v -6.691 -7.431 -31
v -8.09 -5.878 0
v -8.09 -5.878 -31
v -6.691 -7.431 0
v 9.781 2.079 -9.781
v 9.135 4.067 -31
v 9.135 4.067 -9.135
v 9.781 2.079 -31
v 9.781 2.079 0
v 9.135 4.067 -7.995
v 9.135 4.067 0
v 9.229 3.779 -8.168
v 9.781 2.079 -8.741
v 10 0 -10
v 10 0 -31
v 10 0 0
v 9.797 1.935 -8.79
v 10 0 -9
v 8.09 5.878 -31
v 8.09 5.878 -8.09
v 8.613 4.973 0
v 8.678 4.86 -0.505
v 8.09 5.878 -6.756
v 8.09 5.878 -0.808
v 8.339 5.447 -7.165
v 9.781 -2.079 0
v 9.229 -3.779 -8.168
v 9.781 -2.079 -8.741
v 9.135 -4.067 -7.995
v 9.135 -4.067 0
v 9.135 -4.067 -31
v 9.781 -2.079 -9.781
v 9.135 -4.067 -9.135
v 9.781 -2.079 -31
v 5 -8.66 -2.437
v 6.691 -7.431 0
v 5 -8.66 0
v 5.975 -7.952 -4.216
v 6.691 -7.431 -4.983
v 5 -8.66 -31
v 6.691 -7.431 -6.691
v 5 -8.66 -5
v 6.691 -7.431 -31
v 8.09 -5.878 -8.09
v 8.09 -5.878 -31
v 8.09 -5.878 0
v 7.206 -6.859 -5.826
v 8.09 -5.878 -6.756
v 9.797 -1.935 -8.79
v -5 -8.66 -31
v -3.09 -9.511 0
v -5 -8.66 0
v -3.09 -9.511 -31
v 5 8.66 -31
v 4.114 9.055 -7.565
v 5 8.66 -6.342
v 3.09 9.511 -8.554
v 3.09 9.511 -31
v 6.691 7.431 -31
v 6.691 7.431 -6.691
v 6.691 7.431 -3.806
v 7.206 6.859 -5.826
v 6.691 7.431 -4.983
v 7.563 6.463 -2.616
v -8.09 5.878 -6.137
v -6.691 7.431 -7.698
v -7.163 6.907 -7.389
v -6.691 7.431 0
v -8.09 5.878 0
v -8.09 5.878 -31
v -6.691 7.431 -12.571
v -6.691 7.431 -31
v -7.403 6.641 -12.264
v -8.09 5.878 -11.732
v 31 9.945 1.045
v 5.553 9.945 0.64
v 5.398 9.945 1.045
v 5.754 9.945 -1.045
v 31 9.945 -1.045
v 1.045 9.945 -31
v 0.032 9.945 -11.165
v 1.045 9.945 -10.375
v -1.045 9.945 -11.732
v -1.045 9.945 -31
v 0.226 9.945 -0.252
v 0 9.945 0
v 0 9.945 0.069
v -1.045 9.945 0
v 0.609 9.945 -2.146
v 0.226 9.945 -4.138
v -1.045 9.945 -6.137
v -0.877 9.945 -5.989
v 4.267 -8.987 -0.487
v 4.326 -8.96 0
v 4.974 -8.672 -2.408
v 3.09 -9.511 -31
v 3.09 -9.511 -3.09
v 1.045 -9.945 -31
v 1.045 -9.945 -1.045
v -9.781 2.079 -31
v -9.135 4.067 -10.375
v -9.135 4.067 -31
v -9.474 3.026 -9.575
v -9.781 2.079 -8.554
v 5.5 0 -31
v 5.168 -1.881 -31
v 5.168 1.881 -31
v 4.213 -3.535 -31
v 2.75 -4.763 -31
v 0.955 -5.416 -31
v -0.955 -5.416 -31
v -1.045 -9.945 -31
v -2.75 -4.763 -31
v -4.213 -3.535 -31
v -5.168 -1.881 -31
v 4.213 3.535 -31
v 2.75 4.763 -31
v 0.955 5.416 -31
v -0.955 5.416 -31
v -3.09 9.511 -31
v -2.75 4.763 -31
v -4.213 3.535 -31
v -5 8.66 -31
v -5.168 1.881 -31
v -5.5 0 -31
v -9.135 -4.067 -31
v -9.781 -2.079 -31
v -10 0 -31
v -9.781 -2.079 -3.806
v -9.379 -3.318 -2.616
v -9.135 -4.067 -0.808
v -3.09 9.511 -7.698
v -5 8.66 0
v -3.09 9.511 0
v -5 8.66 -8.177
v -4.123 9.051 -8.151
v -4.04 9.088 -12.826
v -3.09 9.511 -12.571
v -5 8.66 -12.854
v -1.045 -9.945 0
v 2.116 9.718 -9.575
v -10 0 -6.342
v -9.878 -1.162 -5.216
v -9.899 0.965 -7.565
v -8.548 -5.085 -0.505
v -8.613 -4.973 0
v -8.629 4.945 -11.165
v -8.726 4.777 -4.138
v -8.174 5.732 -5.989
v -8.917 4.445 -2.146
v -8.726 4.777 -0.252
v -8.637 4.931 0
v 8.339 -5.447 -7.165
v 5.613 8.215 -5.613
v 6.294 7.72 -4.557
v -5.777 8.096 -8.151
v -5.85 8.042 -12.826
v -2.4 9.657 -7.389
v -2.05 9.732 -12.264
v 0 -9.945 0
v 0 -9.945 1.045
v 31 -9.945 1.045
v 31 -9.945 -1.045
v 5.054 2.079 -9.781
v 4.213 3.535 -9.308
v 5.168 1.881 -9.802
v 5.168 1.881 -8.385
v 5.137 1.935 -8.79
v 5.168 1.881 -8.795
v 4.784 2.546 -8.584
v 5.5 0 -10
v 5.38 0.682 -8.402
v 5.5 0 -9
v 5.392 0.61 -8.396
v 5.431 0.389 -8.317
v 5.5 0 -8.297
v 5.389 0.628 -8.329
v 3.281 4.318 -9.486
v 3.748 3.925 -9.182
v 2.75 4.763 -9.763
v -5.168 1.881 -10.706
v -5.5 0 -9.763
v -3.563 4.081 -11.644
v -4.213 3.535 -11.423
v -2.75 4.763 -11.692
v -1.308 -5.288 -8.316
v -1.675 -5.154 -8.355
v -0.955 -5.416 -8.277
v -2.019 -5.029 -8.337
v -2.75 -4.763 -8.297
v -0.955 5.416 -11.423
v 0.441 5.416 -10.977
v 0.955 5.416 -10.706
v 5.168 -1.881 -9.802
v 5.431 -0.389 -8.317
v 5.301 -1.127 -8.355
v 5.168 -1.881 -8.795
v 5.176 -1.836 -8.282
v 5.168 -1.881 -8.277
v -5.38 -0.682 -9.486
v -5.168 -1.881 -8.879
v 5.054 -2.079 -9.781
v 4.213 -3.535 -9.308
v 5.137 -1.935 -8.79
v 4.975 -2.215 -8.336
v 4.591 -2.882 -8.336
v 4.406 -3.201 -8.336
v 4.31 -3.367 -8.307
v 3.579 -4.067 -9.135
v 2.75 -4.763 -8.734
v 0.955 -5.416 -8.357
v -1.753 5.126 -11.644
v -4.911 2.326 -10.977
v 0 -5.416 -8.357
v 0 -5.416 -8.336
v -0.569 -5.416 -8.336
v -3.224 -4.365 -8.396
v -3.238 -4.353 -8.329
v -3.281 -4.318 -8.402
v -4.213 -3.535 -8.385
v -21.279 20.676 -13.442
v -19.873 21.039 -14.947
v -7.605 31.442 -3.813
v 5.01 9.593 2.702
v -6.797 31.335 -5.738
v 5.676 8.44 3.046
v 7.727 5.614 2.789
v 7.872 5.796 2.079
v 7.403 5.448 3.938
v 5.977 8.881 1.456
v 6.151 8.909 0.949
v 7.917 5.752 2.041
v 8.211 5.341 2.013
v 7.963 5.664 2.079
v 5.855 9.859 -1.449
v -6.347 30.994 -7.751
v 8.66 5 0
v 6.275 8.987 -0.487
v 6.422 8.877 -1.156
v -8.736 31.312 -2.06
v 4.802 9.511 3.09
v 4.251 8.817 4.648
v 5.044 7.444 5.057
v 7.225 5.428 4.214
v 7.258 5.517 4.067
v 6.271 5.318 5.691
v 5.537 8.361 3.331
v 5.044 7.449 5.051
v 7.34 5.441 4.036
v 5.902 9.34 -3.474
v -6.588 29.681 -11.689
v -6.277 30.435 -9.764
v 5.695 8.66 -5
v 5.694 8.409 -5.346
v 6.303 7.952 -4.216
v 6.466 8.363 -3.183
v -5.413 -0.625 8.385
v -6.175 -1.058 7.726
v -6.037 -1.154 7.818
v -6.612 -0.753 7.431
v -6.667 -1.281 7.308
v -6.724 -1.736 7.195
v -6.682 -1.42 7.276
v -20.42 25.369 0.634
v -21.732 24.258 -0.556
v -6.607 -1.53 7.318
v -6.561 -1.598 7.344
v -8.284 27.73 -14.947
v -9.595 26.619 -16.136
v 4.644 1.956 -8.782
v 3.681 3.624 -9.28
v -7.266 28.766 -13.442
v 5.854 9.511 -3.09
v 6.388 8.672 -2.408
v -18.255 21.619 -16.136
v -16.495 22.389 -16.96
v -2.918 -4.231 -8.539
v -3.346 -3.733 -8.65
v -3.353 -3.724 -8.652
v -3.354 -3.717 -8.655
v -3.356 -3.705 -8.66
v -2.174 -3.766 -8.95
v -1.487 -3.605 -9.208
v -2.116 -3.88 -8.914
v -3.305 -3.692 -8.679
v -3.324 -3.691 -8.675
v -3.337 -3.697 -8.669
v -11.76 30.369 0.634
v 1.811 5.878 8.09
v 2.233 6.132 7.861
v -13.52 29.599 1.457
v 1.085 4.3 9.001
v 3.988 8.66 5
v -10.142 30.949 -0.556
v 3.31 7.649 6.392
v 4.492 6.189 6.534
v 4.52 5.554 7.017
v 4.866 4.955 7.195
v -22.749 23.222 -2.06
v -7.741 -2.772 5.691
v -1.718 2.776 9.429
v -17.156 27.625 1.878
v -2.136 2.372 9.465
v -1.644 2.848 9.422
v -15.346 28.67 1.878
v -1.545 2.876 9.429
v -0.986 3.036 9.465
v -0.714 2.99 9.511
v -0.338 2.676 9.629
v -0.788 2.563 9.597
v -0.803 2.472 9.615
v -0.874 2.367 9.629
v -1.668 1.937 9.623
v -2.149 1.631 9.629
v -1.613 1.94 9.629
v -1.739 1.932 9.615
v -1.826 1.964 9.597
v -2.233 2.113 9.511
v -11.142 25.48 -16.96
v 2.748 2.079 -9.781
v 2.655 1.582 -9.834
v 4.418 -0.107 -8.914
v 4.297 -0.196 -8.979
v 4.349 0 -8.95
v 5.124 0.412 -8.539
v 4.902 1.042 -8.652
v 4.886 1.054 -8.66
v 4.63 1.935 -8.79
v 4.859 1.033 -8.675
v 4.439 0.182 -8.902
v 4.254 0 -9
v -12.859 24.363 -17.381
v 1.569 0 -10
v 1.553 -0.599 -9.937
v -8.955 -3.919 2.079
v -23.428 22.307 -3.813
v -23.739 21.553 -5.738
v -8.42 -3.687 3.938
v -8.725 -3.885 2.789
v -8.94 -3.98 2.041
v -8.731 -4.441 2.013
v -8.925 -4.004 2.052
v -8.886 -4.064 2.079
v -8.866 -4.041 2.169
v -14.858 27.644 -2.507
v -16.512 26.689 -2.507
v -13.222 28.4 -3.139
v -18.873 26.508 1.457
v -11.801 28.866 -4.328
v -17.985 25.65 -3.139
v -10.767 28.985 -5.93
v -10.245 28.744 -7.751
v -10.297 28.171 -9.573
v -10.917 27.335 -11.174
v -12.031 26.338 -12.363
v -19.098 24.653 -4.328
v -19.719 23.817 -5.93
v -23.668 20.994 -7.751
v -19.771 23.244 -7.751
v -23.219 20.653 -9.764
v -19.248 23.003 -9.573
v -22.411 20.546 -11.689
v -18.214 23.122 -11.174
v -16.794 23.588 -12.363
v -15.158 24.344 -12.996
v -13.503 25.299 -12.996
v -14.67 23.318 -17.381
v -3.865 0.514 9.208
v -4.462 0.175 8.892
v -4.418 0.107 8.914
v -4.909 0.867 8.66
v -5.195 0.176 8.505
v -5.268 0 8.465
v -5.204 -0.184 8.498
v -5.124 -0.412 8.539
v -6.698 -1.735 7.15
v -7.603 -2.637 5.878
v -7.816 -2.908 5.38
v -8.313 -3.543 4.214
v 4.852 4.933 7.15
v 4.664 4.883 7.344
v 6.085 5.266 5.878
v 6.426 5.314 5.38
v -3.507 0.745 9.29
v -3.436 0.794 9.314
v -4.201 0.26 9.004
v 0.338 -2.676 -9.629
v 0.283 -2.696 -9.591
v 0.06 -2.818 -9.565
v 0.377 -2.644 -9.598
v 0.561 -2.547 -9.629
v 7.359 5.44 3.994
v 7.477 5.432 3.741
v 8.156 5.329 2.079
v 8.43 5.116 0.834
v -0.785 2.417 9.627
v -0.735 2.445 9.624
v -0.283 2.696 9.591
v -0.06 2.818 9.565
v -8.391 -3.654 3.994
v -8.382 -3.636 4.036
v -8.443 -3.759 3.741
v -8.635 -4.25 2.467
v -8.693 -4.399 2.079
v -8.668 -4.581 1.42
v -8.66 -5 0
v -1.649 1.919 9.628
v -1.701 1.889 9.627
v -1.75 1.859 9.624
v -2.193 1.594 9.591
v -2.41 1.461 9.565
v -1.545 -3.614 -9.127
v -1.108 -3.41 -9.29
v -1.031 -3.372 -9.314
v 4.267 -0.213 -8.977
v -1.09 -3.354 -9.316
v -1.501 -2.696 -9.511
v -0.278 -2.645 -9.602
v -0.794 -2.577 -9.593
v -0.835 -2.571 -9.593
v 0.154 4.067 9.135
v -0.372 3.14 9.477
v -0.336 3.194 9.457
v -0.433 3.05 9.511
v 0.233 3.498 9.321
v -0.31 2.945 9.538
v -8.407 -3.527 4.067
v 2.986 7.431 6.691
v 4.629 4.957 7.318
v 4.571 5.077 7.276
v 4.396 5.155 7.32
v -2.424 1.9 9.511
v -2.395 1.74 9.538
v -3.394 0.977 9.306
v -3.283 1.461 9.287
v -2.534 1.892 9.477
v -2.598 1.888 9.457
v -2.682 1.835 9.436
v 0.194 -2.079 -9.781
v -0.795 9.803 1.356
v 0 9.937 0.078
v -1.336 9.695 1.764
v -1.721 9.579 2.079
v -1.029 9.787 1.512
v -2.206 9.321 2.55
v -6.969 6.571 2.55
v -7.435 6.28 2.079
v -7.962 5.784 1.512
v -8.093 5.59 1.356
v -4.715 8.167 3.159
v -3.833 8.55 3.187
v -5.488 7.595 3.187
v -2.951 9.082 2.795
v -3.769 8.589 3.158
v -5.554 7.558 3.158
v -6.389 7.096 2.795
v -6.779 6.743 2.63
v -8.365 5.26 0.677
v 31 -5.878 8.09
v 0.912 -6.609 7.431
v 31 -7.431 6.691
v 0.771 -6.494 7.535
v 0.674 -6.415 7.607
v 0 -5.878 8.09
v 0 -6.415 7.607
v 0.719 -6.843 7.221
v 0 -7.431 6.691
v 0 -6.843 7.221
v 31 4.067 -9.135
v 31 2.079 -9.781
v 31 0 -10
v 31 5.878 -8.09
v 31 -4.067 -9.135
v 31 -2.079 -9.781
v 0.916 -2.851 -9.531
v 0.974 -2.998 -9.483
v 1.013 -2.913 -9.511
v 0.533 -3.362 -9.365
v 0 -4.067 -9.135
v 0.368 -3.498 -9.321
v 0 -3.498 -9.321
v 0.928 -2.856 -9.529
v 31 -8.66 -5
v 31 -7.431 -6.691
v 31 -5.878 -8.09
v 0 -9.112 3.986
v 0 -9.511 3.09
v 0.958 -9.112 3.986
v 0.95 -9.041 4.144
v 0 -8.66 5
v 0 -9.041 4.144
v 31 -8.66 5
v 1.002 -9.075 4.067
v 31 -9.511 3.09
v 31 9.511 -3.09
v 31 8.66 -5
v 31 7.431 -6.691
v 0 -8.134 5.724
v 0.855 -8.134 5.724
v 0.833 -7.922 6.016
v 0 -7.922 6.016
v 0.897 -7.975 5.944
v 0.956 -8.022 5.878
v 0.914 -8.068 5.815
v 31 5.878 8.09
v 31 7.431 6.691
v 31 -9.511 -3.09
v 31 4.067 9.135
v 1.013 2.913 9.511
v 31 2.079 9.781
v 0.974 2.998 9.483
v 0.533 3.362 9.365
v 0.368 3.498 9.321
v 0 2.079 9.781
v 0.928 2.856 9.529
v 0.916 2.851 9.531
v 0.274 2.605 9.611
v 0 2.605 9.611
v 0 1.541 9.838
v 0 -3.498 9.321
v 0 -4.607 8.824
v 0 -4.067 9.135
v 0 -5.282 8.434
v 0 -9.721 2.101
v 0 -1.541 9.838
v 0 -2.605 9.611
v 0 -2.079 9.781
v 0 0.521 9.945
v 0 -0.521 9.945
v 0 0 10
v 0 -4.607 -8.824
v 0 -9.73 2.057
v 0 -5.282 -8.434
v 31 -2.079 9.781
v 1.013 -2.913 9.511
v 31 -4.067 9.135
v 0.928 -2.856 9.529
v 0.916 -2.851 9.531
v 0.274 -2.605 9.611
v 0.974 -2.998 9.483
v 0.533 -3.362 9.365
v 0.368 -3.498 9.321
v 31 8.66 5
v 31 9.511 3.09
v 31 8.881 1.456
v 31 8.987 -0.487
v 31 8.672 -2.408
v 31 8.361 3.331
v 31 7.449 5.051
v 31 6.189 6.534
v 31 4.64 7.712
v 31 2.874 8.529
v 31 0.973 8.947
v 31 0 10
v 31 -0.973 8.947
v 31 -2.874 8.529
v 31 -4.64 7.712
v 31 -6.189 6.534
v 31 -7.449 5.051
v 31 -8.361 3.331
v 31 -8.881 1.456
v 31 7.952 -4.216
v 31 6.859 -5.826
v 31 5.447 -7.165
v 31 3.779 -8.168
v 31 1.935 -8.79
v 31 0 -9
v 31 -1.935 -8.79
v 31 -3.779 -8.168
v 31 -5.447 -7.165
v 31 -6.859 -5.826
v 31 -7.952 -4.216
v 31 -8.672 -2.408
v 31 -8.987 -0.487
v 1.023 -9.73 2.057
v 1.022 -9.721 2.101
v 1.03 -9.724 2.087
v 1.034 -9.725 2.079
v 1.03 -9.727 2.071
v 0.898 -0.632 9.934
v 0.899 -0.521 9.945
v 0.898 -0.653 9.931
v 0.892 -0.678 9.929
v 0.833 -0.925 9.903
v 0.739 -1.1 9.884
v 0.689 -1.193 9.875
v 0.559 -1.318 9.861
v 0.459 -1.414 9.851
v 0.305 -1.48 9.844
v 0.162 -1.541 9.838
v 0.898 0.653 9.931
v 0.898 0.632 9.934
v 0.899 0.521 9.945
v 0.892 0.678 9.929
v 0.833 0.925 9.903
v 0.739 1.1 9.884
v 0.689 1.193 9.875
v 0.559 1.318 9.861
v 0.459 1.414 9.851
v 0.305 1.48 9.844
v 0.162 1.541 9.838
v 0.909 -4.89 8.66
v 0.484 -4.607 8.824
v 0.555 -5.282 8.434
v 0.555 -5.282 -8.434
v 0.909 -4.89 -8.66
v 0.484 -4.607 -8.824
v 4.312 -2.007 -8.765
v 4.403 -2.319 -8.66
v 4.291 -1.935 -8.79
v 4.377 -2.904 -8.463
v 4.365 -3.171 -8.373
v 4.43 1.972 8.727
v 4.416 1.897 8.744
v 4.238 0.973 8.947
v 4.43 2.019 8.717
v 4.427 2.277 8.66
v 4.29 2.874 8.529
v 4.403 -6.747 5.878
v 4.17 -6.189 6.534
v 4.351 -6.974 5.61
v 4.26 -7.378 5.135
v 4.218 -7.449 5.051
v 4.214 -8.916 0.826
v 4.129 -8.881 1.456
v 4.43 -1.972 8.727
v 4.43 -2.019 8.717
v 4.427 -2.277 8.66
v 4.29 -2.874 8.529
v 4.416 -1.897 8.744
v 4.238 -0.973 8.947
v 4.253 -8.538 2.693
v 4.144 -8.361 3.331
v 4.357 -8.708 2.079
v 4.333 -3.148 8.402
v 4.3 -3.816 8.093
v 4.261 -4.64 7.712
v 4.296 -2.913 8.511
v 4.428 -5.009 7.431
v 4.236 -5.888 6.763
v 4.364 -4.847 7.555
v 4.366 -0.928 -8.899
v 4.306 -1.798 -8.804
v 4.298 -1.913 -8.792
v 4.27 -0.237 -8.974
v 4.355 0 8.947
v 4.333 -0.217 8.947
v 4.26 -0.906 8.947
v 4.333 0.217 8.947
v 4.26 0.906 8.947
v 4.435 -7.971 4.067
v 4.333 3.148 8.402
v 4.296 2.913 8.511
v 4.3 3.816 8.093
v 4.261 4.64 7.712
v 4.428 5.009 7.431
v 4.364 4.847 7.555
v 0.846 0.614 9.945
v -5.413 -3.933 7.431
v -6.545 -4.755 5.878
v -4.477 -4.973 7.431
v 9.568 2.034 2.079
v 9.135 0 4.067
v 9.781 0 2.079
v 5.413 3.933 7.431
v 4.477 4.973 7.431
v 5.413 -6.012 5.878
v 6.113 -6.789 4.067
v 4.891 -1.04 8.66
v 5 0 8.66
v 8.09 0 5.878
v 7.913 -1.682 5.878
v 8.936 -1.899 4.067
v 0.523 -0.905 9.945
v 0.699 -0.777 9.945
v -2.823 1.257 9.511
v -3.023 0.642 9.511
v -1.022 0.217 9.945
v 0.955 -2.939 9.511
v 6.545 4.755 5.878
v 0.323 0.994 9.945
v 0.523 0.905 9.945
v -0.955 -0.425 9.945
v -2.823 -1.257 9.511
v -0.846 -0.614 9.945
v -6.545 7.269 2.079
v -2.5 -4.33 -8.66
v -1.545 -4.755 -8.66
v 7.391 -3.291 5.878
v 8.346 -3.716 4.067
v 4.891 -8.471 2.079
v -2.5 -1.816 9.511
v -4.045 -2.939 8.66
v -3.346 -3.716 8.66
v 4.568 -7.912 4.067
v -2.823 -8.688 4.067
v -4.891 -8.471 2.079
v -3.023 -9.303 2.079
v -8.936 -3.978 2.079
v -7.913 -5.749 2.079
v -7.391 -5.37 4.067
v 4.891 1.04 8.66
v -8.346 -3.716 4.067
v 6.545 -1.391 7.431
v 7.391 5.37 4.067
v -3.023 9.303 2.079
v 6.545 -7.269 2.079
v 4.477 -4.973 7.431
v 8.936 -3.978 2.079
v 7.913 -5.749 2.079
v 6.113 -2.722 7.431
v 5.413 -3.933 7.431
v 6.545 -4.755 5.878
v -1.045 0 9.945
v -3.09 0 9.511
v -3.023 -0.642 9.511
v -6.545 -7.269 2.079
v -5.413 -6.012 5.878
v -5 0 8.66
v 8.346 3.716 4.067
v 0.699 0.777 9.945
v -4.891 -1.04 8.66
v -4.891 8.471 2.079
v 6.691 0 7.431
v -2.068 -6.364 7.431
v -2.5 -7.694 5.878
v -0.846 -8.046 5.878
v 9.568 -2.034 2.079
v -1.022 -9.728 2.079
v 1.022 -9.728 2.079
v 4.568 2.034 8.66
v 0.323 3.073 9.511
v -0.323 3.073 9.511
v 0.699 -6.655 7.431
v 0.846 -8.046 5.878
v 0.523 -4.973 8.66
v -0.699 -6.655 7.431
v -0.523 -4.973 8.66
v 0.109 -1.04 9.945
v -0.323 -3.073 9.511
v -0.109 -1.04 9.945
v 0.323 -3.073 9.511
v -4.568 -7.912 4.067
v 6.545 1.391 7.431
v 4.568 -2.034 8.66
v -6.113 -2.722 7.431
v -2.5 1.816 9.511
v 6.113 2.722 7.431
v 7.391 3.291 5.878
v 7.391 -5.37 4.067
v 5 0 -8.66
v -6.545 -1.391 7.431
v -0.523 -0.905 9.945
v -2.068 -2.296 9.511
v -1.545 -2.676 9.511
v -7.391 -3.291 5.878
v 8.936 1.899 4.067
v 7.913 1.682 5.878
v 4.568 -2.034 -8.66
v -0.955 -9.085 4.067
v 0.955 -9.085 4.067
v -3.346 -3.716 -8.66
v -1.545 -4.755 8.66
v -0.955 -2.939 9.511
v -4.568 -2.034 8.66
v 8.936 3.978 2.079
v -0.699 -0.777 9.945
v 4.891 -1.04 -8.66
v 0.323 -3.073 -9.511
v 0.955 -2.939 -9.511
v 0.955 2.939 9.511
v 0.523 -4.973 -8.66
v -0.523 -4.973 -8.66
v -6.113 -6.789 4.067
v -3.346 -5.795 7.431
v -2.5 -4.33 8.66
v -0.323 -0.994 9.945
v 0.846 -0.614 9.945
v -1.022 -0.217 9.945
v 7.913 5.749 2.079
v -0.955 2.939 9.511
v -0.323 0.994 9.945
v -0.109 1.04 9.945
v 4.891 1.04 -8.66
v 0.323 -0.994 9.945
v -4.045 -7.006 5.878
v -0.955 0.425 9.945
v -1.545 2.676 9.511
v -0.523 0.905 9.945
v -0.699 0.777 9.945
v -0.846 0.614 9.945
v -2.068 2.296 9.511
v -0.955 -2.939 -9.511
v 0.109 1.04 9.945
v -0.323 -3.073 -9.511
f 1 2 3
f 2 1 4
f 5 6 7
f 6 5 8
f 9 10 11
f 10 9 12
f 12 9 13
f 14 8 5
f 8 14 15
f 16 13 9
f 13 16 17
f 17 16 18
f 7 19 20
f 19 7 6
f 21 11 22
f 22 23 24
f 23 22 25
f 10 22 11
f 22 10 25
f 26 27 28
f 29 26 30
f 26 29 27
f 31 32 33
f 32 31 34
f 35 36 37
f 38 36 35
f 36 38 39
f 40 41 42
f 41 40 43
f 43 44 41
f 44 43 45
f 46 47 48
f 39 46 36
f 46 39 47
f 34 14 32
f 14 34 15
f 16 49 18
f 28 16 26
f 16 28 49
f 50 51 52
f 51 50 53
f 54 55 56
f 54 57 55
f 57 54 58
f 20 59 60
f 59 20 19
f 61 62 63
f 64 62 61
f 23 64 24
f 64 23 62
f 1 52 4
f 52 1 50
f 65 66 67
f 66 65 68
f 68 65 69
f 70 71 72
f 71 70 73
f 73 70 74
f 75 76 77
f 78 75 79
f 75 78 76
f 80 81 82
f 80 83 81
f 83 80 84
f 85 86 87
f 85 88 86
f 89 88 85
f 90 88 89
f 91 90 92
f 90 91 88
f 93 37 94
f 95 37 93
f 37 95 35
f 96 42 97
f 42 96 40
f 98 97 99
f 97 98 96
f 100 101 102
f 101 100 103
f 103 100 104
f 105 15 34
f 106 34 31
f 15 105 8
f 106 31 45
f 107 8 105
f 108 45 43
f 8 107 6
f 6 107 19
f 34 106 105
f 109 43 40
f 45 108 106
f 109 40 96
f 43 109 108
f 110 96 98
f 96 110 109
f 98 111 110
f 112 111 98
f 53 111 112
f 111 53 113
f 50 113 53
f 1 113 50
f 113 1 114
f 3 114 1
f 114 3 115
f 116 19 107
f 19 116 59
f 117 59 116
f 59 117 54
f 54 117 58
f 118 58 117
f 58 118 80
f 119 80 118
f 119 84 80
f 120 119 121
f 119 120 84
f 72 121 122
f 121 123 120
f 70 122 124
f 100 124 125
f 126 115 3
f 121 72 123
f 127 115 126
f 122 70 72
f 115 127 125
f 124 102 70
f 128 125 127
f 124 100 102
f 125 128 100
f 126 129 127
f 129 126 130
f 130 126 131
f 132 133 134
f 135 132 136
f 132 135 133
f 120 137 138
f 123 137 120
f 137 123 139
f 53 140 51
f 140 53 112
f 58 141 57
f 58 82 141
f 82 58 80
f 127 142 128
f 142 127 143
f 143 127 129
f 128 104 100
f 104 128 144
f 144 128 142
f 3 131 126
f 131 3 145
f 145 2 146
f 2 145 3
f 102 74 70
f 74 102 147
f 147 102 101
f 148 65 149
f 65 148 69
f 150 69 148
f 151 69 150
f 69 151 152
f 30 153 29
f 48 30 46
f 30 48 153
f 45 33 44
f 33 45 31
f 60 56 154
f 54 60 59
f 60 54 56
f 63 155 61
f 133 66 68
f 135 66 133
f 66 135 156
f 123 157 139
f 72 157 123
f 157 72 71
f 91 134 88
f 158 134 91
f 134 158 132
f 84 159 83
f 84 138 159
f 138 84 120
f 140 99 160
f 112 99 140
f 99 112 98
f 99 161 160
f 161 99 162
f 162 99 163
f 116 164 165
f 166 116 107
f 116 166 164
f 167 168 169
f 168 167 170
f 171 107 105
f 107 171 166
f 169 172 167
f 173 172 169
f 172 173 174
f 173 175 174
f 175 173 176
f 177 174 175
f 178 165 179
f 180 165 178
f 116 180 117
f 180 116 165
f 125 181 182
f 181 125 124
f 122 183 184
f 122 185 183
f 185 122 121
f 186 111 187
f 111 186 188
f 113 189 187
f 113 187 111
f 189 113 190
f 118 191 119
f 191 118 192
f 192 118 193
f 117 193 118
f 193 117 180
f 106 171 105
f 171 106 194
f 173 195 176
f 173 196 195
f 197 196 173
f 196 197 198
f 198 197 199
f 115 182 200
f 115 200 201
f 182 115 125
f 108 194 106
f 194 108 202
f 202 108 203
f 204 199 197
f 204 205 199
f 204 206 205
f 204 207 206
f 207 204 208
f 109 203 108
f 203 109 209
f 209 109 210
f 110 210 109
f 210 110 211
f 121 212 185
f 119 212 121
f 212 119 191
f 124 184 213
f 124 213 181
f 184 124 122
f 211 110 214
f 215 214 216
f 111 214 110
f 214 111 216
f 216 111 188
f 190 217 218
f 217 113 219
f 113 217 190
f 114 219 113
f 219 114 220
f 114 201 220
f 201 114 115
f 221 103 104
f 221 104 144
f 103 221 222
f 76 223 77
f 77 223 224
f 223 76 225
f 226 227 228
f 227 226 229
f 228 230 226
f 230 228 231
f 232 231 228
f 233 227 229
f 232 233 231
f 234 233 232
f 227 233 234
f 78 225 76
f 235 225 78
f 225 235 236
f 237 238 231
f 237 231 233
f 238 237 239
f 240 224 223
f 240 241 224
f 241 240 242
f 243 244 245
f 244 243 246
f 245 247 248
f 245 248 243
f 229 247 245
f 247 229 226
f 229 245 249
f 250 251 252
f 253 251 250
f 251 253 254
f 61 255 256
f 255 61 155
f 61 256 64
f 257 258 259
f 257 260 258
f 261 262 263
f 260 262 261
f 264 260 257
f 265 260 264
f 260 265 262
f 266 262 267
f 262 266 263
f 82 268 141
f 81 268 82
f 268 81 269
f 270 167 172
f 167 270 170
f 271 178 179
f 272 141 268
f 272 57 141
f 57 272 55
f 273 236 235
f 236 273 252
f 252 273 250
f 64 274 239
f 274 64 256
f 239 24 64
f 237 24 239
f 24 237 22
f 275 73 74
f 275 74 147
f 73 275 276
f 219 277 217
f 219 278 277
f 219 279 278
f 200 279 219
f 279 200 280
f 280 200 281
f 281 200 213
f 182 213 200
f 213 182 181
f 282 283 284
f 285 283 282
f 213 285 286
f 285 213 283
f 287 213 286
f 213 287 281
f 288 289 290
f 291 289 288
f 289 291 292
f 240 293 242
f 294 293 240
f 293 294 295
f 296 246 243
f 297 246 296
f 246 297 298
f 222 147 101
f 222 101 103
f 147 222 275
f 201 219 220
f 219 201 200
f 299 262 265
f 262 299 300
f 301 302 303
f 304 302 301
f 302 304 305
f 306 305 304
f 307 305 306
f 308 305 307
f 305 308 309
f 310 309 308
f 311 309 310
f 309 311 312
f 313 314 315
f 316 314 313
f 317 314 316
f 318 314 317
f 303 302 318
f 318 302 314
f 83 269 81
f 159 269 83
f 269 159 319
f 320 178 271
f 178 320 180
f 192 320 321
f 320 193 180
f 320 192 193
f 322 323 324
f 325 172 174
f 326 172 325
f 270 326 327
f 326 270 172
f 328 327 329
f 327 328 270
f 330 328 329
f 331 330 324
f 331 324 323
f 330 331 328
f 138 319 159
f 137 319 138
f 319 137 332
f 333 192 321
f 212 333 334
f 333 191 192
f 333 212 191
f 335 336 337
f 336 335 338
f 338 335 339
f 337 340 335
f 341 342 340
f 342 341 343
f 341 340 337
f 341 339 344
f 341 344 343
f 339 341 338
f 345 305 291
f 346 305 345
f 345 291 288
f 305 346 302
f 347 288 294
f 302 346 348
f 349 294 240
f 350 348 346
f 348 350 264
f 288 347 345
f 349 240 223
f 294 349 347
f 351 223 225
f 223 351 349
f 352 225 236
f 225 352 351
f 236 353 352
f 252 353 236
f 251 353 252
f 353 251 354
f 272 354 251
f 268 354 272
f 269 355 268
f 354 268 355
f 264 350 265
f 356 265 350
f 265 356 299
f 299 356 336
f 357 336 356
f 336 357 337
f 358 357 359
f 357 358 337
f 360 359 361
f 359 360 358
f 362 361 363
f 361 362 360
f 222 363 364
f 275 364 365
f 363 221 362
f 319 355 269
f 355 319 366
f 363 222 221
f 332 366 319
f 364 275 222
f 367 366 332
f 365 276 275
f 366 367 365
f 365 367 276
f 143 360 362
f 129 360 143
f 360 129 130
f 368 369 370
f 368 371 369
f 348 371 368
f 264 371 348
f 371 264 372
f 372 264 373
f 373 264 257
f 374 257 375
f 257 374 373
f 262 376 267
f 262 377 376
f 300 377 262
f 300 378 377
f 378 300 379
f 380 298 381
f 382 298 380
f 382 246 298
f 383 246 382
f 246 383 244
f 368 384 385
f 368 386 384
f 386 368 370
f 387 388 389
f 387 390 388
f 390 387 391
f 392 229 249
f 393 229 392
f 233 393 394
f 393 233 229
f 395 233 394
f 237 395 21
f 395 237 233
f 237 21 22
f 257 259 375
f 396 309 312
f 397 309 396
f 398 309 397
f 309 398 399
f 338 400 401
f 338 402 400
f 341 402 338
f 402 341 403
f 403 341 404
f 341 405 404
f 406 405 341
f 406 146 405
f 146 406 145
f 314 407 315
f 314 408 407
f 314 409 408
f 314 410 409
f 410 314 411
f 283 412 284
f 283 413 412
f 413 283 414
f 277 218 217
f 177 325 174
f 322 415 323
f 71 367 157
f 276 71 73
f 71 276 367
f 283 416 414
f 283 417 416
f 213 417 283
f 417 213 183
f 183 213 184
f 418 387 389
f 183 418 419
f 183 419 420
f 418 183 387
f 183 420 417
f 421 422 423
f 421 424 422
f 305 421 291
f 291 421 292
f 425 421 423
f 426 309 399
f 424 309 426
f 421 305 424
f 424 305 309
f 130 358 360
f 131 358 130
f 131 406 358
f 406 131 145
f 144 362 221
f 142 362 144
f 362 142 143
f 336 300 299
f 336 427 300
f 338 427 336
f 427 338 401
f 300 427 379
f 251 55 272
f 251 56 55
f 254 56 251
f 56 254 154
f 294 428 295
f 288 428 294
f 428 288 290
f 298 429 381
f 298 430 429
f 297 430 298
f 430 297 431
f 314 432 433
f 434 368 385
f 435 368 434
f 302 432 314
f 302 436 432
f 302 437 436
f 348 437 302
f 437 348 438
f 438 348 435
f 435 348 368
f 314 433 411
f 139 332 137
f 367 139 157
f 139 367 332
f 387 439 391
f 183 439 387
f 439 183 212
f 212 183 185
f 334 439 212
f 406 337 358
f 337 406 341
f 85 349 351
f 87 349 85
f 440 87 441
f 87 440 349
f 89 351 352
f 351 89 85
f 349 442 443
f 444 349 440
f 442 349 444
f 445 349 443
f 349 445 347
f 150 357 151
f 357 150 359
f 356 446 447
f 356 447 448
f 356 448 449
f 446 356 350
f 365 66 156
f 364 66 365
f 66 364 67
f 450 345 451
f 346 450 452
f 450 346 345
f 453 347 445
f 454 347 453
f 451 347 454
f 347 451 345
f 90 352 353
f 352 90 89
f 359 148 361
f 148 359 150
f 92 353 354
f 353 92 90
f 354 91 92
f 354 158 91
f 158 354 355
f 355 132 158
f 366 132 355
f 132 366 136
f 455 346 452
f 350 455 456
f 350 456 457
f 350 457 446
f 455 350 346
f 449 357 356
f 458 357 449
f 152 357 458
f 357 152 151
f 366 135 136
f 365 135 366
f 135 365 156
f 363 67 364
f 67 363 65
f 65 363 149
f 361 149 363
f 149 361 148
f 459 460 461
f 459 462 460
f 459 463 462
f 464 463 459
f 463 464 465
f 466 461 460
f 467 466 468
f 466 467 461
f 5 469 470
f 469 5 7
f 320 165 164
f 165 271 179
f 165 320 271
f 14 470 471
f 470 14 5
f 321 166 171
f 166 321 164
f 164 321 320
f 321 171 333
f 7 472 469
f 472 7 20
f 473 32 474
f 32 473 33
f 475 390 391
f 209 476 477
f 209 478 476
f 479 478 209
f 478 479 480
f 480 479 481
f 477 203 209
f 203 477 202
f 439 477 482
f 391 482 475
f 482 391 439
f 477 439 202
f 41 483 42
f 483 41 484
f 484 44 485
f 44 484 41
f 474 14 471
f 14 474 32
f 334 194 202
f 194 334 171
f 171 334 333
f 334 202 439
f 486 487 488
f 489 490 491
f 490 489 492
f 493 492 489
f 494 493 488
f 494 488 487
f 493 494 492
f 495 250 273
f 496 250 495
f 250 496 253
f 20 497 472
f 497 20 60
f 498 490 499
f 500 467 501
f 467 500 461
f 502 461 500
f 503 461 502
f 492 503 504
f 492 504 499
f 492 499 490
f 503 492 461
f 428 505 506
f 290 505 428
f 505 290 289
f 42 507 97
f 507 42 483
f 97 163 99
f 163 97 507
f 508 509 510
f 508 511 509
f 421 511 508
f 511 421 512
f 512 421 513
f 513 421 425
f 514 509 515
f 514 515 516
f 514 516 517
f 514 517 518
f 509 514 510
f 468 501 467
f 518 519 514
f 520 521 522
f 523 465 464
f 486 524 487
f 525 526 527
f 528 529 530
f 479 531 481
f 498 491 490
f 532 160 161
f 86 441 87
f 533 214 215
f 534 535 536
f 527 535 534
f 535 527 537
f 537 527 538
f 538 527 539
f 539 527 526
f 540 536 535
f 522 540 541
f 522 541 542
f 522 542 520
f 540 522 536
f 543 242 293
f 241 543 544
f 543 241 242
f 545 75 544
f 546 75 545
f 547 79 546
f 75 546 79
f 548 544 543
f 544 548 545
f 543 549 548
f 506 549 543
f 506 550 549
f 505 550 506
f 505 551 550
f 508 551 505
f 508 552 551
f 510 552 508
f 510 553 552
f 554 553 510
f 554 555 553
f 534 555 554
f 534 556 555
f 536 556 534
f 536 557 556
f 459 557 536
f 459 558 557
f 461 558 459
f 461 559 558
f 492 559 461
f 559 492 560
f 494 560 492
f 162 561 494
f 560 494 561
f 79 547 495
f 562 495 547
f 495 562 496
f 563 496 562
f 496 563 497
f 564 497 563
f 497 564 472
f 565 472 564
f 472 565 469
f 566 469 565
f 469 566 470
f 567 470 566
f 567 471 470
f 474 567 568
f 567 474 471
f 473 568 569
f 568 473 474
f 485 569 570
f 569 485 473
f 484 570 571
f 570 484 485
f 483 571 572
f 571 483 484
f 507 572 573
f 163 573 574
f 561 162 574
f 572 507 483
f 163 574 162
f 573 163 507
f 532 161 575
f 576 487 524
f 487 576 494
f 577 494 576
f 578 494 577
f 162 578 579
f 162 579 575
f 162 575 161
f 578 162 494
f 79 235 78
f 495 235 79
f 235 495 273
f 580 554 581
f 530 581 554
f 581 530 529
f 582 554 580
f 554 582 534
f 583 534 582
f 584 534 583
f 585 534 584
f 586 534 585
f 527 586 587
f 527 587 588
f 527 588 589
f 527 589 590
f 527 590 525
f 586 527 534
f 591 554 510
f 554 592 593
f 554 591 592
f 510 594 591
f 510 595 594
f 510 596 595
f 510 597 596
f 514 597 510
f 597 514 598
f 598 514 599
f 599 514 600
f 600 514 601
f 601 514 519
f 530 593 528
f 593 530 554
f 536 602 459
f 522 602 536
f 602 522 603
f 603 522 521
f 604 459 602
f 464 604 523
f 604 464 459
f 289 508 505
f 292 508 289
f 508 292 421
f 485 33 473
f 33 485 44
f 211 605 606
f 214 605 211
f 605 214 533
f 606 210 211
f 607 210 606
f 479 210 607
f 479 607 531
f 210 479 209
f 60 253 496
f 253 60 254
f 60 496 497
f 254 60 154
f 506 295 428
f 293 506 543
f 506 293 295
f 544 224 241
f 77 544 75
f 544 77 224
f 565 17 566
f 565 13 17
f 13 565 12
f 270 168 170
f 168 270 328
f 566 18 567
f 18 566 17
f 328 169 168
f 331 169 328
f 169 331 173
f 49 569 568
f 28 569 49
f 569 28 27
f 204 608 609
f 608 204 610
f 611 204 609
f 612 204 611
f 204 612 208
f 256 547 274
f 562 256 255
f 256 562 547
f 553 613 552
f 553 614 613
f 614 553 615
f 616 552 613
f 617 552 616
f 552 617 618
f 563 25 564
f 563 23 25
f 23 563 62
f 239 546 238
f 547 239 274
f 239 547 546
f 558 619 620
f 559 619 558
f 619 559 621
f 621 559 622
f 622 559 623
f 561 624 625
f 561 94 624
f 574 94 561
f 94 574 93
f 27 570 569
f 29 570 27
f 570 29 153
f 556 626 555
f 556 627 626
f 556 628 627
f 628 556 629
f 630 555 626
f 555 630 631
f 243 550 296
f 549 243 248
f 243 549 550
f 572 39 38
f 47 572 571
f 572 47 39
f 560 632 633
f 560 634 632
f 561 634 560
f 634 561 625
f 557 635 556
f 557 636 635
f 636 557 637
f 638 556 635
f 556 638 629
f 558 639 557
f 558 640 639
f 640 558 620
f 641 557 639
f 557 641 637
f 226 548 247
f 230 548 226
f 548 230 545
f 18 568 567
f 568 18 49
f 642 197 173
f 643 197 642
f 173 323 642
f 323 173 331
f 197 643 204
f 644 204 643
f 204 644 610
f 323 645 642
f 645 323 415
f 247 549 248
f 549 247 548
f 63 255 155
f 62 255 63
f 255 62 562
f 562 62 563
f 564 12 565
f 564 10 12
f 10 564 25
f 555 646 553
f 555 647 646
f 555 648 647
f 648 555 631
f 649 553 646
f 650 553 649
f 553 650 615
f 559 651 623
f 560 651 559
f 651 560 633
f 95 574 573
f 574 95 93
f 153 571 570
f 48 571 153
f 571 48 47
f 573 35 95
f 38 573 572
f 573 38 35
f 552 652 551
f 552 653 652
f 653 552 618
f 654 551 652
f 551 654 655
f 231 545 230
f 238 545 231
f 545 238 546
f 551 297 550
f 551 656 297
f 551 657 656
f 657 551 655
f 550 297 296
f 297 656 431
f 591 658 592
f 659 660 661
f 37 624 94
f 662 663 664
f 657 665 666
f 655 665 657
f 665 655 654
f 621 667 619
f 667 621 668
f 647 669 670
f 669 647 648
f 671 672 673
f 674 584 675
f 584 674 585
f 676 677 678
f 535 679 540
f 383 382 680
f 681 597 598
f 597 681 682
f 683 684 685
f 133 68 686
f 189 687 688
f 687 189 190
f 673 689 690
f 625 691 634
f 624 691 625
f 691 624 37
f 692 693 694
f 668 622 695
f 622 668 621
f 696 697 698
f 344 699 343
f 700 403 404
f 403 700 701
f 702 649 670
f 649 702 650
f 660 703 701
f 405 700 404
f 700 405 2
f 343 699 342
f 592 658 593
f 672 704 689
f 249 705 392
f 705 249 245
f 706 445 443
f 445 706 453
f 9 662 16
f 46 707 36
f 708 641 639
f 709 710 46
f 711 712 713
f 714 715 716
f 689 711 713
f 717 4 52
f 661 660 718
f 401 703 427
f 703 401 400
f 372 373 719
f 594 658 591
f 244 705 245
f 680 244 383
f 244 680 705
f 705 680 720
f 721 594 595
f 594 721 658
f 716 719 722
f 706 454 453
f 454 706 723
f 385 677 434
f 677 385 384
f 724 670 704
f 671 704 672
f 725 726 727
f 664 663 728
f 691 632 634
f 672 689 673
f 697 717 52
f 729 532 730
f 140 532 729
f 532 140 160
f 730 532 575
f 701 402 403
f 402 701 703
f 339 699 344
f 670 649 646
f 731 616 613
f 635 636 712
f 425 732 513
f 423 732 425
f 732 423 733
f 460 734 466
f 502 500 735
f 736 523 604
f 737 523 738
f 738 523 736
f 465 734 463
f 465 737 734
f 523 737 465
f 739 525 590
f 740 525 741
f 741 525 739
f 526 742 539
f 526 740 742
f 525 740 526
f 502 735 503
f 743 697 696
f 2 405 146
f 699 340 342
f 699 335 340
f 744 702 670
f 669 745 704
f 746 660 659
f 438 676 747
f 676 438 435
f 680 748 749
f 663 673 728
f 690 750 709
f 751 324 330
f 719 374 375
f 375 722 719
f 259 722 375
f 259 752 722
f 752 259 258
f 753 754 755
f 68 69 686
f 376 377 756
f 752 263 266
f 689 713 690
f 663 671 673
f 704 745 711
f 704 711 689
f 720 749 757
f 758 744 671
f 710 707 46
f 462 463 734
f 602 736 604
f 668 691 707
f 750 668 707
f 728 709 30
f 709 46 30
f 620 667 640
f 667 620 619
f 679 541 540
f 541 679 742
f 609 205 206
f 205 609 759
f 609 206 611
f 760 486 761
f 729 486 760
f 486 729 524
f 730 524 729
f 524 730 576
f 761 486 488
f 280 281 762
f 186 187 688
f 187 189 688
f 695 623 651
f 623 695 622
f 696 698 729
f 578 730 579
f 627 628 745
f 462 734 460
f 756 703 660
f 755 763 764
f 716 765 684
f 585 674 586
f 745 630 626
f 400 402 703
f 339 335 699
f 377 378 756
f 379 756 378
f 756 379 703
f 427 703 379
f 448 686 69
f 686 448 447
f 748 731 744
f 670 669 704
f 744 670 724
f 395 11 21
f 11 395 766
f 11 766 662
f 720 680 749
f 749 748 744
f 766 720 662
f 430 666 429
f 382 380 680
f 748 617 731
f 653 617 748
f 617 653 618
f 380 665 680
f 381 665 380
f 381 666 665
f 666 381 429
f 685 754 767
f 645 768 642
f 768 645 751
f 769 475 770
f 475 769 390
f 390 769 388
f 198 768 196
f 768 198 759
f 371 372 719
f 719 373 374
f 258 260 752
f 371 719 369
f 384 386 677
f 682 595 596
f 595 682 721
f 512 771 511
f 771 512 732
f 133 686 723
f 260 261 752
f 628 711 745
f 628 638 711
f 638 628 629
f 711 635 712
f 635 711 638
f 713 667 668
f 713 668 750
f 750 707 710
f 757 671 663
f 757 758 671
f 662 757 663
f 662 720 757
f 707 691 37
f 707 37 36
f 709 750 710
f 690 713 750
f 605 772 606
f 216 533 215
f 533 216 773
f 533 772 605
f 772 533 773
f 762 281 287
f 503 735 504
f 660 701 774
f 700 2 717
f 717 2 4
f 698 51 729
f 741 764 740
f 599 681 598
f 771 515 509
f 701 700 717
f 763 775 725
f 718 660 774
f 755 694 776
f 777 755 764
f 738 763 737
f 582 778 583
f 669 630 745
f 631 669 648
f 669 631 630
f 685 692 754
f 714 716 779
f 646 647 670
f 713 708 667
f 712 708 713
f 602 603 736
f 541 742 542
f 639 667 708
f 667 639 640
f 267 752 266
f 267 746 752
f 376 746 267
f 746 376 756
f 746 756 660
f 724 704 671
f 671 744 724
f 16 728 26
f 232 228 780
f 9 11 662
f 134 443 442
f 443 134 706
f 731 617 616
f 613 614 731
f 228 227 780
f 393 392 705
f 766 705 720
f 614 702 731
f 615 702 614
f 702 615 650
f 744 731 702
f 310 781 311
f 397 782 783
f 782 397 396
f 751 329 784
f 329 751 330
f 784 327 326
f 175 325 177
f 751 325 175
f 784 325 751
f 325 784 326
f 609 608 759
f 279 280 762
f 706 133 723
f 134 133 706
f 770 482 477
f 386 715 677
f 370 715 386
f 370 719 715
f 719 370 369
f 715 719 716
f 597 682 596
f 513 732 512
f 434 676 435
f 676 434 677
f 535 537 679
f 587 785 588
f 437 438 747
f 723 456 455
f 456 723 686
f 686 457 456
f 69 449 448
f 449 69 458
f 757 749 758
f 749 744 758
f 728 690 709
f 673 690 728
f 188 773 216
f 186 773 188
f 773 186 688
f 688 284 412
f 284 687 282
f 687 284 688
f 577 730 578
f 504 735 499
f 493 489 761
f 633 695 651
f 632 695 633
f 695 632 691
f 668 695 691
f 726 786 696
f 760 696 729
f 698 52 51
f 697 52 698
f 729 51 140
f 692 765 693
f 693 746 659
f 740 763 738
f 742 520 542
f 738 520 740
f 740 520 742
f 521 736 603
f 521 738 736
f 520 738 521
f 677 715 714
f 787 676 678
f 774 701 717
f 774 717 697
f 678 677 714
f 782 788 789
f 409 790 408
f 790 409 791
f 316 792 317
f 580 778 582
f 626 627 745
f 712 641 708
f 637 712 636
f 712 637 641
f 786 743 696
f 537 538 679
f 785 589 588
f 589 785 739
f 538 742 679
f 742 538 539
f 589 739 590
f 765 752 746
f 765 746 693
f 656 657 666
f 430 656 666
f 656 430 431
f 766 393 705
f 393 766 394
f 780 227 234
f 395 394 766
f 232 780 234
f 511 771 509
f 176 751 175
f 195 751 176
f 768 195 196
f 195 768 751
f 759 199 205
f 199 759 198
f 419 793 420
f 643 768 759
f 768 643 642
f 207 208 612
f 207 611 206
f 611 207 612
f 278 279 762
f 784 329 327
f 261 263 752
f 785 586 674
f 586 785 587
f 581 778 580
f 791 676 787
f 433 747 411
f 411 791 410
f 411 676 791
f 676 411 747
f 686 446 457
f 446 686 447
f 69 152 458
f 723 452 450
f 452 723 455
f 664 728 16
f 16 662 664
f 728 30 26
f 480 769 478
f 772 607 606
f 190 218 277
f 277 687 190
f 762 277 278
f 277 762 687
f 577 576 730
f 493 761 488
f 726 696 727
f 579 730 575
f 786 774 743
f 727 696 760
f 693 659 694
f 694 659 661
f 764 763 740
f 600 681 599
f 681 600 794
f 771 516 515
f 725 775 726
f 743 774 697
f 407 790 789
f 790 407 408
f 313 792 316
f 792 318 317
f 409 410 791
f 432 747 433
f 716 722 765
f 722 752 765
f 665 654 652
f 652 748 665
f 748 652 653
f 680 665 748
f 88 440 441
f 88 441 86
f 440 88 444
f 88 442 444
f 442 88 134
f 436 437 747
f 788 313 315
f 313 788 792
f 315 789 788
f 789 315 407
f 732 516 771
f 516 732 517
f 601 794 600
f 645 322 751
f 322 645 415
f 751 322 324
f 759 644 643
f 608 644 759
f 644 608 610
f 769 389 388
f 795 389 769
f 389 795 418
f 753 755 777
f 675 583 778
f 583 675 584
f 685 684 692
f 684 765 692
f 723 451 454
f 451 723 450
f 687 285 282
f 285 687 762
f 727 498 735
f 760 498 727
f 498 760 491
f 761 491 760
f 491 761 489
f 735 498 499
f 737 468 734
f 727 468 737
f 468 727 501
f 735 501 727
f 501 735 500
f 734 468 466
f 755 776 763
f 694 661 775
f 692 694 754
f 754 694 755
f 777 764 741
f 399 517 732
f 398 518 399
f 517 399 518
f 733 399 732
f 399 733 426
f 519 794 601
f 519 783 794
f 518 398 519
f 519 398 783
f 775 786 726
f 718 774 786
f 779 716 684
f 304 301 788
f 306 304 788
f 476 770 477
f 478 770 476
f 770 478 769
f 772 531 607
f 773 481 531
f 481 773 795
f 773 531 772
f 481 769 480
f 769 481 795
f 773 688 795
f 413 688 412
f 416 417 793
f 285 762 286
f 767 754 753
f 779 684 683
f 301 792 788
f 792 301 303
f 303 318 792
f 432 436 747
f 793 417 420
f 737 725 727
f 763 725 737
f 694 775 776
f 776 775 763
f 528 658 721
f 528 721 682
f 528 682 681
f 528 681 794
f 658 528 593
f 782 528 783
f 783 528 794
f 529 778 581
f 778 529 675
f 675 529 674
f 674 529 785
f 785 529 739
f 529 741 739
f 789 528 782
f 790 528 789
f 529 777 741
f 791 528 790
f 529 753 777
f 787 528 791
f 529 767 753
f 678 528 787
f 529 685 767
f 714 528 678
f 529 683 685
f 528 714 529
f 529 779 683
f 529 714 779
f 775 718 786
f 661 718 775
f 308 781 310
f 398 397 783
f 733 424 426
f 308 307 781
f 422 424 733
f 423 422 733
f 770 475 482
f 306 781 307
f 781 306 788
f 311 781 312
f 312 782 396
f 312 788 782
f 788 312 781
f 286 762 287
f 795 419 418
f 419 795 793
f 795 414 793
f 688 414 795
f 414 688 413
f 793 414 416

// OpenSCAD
width=10;

sphere (10);

//cylinder 1 z たて
difference(){
    translate ([0,0,-31])cylinder(h=31, d=20);
    translate([0,0,-33])cylinder(h=30, d=11);
}

//cylinder 2
rotate([75.52,0,30])difference(){
        translate ([0,0,-31])
        cylinder (h=31, d=20);
        translate([0,0,-32])
        cylinder(h=31, d=11); 
        }

//cylinder 3        
translate([0,0,0]) rotate([0,90,0])difference(){
        cylinder (h=31, d=20);
        translate([0,0,+3]) ;
        cylinder(h=32, d=18); 
        }
